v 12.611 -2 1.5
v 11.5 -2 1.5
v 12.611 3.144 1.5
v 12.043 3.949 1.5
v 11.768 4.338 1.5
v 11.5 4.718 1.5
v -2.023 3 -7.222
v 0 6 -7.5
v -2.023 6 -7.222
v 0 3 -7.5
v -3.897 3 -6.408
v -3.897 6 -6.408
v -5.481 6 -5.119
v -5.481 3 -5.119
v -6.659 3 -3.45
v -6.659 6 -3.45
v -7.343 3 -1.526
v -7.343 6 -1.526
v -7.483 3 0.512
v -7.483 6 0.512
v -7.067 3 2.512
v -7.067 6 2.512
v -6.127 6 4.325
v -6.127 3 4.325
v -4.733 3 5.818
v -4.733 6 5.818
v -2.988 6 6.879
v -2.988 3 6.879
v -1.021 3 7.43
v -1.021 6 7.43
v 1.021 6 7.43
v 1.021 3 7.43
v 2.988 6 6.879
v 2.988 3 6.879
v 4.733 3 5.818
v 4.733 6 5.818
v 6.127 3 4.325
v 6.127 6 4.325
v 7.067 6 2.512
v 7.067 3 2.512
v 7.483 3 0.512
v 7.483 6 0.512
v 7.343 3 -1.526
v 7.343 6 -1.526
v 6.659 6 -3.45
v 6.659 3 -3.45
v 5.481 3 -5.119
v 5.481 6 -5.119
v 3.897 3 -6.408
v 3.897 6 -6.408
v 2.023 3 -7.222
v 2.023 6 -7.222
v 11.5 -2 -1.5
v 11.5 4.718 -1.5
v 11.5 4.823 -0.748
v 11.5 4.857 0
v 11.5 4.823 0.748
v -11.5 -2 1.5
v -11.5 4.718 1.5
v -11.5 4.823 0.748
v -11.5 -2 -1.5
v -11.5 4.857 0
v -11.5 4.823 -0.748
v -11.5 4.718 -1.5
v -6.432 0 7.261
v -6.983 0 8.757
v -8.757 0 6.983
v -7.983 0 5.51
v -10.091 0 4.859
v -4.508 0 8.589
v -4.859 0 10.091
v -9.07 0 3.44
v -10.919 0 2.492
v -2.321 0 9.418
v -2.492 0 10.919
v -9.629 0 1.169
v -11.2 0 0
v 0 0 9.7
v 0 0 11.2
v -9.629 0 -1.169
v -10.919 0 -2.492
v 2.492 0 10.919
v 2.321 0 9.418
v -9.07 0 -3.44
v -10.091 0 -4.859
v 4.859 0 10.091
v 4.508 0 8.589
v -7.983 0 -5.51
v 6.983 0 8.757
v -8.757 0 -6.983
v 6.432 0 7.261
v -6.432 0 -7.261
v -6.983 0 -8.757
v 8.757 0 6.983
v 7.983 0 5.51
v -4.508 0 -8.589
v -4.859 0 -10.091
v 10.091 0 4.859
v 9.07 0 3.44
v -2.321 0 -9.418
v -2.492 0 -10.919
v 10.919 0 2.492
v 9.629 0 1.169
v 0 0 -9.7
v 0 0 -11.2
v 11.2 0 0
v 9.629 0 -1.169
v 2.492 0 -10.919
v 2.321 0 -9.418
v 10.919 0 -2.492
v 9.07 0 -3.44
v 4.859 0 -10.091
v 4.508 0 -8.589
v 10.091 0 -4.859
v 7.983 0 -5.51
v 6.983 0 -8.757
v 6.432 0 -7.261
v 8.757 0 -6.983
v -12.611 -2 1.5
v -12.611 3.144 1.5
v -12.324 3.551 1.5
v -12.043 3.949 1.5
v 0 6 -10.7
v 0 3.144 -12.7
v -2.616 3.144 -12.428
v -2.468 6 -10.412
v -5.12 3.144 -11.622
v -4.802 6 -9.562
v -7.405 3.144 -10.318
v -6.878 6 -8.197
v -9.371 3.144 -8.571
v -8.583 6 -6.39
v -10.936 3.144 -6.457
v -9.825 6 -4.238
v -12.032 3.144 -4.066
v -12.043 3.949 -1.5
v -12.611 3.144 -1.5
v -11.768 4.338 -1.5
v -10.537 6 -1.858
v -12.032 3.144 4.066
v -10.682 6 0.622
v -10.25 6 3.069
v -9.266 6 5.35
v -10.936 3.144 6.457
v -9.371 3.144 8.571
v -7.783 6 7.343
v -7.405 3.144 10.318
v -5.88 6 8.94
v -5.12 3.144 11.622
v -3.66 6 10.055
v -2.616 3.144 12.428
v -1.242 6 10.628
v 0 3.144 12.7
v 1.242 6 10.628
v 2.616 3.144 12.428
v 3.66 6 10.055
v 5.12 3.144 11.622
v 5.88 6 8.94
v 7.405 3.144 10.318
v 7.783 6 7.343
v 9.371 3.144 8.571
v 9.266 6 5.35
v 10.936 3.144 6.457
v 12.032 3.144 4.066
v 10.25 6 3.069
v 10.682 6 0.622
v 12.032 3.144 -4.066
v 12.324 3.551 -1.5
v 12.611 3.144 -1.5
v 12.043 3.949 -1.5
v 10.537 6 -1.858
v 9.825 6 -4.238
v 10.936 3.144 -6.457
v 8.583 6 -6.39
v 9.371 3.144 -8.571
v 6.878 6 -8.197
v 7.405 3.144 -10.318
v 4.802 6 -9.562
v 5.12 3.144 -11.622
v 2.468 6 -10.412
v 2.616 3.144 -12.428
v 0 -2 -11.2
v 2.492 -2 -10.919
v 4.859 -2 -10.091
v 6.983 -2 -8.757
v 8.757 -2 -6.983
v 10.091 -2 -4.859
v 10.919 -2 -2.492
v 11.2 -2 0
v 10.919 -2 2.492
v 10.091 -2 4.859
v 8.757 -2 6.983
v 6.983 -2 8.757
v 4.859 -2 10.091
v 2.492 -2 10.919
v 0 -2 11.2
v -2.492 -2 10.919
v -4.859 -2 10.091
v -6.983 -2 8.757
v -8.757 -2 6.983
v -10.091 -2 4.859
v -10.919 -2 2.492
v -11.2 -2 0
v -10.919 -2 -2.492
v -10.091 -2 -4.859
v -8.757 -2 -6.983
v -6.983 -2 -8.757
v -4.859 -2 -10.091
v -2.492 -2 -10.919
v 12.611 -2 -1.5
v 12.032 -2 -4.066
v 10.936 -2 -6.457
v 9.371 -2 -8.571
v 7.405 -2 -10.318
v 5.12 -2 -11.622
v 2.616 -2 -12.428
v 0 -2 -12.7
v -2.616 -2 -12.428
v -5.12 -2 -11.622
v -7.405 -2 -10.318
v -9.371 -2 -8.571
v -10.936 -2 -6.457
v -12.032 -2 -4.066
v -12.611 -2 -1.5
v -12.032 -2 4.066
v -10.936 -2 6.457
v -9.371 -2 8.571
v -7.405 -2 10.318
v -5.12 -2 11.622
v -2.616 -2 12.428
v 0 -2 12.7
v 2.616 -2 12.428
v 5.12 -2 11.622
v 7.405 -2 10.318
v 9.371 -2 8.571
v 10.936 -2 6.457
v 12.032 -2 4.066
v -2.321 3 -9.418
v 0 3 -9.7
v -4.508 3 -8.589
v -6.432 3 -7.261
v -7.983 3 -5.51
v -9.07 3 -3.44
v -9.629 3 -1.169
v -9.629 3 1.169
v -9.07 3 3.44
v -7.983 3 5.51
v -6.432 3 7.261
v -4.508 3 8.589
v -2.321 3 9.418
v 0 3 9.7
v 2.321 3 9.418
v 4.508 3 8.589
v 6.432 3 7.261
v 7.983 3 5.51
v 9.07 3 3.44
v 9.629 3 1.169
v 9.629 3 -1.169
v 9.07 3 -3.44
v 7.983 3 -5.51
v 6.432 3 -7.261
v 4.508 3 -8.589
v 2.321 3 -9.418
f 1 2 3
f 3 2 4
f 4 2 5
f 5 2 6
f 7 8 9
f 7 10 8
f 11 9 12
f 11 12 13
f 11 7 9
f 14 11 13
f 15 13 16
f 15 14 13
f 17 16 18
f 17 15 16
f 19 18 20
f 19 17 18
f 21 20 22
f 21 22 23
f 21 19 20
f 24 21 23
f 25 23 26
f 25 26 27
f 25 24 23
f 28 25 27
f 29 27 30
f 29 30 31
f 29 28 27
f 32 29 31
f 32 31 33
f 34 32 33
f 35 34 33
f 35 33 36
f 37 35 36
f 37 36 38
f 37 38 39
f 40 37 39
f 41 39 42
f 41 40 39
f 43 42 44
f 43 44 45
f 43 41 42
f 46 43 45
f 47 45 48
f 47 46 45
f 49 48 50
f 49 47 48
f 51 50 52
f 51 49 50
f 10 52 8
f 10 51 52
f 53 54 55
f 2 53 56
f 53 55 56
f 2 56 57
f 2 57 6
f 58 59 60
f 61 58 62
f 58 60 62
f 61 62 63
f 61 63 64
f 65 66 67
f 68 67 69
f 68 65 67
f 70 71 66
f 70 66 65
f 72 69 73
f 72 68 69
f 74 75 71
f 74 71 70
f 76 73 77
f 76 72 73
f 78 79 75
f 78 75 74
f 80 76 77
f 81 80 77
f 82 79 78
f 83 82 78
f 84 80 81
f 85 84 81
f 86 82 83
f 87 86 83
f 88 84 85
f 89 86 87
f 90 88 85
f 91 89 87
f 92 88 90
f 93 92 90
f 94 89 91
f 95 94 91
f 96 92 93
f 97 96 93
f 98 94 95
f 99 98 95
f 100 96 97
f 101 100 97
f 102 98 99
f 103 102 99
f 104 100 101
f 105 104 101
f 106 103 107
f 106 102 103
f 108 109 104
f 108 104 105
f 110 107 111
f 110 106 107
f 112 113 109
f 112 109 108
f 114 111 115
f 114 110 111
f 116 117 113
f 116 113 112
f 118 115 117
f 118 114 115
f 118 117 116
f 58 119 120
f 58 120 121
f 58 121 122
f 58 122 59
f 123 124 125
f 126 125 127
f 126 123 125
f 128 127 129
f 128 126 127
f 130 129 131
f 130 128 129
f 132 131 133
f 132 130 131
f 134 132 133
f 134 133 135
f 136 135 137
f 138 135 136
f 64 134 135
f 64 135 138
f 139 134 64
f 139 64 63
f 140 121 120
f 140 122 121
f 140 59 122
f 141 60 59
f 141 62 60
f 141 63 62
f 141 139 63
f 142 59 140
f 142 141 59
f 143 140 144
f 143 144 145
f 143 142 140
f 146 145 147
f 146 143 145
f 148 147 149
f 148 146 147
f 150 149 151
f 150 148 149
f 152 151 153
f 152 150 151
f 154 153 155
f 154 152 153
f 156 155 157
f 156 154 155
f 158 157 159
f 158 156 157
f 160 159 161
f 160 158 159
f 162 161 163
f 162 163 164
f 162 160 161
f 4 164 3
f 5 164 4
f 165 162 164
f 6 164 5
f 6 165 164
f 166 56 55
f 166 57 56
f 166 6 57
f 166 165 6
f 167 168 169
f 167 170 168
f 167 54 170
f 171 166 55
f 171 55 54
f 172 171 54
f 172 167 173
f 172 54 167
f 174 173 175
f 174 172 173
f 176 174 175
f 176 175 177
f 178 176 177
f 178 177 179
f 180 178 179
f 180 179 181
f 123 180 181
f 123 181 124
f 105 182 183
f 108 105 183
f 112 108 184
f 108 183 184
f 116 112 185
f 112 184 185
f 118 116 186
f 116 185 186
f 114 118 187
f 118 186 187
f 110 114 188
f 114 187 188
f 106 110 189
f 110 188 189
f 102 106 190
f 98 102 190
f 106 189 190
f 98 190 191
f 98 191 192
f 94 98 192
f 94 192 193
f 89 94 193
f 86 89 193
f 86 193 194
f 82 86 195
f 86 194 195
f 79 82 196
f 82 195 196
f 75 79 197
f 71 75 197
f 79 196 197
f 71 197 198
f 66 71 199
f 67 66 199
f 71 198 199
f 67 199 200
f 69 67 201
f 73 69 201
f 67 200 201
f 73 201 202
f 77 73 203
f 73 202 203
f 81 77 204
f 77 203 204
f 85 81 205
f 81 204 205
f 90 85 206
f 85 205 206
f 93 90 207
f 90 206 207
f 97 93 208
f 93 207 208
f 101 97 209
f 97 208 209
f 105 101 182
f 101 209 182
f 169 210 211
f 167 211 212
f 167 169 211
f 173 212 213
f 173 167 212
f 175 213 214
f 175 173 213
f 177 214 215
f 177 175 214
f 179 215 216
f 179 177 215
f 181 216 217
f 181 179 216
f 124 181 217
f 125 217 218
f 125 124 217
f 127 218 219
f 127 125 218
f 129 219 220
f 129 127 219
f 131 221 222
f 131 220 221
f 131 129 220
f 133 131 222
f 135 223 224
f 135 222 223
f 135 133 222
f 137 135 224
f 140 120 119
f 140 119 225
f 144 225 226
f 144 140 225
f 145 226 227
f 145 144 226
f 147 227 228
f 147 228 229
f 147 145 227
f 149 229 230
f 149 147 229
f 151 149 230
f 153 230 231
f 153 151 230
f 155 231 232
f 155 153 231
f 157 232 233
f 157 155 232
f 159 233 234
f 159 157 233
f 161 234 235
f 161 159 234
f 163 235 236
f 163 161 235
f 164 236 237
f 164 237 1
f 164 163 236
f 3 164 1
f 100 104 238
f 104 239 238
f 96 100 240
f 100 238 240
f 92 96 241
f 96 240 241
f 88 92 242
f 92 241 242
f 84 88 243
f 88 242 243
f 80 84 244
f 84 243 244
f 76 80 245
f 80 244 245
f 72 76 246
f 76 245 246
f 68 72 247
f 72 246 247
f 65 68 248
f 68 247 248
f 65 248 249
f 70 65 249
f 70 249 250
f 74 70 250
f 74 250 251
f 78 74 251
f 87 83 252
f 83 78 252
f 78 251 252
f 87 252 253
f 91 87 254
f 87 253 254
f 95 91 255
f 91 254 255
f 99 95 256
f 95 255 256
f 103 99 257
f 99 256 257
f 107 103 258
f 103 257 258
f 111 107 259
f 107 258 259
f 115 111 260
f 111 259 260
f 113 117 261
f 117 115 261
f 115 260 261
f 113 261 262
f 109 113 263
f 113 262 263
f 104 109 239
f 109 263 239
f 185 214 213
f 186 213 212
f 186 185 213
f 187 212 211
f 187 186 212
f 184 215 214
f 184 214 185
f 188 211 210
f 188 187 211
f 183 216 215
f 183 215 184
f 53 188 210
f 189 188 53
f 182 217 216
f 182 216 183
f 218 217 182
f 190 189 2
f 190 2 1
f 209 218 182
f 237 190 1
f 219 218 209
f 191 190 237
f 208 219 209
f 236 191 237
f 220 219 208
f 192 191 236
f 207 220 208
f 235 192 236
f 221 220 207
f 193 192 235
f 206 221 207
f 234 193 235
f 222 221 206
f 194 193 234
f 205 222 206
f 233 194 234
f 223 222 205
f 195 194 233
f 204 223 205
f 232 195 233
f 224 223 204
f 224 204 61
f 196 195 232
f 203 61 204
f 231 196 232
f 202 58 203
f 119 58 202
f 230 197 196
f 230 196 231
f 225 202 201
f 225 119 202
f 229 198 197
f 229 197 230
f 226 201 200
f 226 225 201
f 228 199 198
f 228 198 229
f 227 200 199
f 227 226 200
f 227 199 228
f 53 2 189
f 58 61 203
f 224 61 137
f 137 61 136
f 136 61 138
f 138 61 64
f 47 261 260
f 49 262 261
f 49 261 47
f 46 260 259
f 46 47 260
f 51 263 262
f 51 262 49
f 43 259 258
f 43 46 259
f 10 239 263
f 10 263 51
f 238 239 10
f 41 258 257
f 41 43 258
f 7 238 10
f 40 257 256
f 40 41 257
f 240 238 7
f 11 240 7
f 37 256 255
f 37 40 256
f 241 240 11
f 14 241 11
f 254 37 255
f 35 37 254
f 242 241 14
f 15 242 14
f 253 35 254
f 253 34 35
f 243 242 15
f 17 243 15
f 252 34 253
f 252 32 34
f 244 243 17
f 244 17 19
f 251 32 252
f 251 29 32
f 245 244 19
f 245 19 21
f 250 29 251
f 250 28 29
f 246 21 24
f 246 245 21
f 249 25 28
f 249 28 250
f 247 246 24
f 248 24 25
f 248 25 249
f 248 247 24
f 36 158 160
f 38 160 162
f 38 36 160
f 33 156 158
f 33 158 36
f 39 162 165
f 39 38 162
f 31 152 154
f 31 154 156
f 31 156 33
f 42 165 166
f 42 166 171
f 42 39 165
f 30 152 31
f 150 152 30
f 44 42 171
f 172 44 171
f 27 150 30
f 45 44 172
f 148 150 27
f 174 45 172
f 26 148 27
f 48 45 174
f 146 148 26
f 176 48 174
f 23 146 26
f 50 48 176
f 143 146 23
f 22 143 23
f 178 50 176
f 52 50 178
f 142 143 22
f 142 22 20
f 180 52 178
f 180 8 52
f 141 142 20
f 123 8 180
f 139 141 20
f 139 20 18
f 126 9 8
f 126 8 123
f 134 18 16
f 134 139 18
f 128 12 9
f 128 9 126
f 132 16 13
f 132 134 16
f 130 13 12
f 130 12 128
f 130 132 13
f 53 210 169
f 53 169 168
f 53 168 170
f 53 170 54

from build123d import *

# Parameters (mm, degrees)
SKETCH4_R          = 11.2
SKETCH4_R_2        = 9.7
CUT_EXTRUDE1_DEPTH = 2
CUT_EXTRUDE5_DEPTH = 20.661637775


with BuildPart() as part:
    # Sketch1 → Revolve1 (revolve)
    with BuildSketch(Plane.XY, mode=Mode.PRIVATE) as revolve1_sk:
        Polygon((-9.7, 0), (-9.7, -2), (-12.7, -2), (-12.7, 3.143703987), (-10.7, 6), (-7.5, 6), (-7.5, 3), (-9.7, 3), align=None)
    revolve(revolve1_sk.sketch.rotate(Axis((0, 0, 0), (0, 1, 0)), 270), axis=Axis((0, 0, 0), (0, 1, 0)))

    # Sketch4 → Cut-Extrude1 (cut)
    with BuildSketch(Plane.XZ.offset(2)):
        with Locations(Location((0, 0, 0), (0, 0, 270))):
            Circle(SKETCH4_R)
        with Locations(Location((0, 0, 0), (0, 0, 270))):
            Circle(SKETCH4_R_2, mode=Mode.SUBTRACT)
    extrude(amount=-CUT_EXTRUDE1_DEPTH, mode=Mode.SUBTRACT)

    # Sketch8 → Cut-Extrude5 (cut, through all)
    with BuildSketch(Plane(origin=(0, 6, 0), x_dir=(1, 0, 0), z_dir=(0, 1, 0))):
        with BuildLine():
            Line((-11.5, -1.5), (-11.5, 1.5))
            Line((-11.5, 1.5), (-12.611106216, 1.5))
            ThreePointArc((-12.611106216, 1.5), (-12.7, 0), (-12.611106216, -1.5))
            Line((-12.611106216, -1.5), (-11.5, -1.5))
        make_face()
        with BuildLine():
            Line((12.611106216, 1.5), (11.5, 1.5))
            Line((11.5, 1.5), (11.5, -1.5))
            Line((11.5, -1.5), (12.611106216, -1.5))
            ThreePointArc((12.611106216, -1.5), (12.677757076, -0.751315863), (12.7, 0))
            ThreePointArc((12.7, 0), (12.677757076, 0.751315863), (12.611106216, 1.5))
        make_face()
    extrude(amount=-CUT_EXTRUDE5_DEPTH, mode=Mode.SUBTRACT)


solid = part.part
